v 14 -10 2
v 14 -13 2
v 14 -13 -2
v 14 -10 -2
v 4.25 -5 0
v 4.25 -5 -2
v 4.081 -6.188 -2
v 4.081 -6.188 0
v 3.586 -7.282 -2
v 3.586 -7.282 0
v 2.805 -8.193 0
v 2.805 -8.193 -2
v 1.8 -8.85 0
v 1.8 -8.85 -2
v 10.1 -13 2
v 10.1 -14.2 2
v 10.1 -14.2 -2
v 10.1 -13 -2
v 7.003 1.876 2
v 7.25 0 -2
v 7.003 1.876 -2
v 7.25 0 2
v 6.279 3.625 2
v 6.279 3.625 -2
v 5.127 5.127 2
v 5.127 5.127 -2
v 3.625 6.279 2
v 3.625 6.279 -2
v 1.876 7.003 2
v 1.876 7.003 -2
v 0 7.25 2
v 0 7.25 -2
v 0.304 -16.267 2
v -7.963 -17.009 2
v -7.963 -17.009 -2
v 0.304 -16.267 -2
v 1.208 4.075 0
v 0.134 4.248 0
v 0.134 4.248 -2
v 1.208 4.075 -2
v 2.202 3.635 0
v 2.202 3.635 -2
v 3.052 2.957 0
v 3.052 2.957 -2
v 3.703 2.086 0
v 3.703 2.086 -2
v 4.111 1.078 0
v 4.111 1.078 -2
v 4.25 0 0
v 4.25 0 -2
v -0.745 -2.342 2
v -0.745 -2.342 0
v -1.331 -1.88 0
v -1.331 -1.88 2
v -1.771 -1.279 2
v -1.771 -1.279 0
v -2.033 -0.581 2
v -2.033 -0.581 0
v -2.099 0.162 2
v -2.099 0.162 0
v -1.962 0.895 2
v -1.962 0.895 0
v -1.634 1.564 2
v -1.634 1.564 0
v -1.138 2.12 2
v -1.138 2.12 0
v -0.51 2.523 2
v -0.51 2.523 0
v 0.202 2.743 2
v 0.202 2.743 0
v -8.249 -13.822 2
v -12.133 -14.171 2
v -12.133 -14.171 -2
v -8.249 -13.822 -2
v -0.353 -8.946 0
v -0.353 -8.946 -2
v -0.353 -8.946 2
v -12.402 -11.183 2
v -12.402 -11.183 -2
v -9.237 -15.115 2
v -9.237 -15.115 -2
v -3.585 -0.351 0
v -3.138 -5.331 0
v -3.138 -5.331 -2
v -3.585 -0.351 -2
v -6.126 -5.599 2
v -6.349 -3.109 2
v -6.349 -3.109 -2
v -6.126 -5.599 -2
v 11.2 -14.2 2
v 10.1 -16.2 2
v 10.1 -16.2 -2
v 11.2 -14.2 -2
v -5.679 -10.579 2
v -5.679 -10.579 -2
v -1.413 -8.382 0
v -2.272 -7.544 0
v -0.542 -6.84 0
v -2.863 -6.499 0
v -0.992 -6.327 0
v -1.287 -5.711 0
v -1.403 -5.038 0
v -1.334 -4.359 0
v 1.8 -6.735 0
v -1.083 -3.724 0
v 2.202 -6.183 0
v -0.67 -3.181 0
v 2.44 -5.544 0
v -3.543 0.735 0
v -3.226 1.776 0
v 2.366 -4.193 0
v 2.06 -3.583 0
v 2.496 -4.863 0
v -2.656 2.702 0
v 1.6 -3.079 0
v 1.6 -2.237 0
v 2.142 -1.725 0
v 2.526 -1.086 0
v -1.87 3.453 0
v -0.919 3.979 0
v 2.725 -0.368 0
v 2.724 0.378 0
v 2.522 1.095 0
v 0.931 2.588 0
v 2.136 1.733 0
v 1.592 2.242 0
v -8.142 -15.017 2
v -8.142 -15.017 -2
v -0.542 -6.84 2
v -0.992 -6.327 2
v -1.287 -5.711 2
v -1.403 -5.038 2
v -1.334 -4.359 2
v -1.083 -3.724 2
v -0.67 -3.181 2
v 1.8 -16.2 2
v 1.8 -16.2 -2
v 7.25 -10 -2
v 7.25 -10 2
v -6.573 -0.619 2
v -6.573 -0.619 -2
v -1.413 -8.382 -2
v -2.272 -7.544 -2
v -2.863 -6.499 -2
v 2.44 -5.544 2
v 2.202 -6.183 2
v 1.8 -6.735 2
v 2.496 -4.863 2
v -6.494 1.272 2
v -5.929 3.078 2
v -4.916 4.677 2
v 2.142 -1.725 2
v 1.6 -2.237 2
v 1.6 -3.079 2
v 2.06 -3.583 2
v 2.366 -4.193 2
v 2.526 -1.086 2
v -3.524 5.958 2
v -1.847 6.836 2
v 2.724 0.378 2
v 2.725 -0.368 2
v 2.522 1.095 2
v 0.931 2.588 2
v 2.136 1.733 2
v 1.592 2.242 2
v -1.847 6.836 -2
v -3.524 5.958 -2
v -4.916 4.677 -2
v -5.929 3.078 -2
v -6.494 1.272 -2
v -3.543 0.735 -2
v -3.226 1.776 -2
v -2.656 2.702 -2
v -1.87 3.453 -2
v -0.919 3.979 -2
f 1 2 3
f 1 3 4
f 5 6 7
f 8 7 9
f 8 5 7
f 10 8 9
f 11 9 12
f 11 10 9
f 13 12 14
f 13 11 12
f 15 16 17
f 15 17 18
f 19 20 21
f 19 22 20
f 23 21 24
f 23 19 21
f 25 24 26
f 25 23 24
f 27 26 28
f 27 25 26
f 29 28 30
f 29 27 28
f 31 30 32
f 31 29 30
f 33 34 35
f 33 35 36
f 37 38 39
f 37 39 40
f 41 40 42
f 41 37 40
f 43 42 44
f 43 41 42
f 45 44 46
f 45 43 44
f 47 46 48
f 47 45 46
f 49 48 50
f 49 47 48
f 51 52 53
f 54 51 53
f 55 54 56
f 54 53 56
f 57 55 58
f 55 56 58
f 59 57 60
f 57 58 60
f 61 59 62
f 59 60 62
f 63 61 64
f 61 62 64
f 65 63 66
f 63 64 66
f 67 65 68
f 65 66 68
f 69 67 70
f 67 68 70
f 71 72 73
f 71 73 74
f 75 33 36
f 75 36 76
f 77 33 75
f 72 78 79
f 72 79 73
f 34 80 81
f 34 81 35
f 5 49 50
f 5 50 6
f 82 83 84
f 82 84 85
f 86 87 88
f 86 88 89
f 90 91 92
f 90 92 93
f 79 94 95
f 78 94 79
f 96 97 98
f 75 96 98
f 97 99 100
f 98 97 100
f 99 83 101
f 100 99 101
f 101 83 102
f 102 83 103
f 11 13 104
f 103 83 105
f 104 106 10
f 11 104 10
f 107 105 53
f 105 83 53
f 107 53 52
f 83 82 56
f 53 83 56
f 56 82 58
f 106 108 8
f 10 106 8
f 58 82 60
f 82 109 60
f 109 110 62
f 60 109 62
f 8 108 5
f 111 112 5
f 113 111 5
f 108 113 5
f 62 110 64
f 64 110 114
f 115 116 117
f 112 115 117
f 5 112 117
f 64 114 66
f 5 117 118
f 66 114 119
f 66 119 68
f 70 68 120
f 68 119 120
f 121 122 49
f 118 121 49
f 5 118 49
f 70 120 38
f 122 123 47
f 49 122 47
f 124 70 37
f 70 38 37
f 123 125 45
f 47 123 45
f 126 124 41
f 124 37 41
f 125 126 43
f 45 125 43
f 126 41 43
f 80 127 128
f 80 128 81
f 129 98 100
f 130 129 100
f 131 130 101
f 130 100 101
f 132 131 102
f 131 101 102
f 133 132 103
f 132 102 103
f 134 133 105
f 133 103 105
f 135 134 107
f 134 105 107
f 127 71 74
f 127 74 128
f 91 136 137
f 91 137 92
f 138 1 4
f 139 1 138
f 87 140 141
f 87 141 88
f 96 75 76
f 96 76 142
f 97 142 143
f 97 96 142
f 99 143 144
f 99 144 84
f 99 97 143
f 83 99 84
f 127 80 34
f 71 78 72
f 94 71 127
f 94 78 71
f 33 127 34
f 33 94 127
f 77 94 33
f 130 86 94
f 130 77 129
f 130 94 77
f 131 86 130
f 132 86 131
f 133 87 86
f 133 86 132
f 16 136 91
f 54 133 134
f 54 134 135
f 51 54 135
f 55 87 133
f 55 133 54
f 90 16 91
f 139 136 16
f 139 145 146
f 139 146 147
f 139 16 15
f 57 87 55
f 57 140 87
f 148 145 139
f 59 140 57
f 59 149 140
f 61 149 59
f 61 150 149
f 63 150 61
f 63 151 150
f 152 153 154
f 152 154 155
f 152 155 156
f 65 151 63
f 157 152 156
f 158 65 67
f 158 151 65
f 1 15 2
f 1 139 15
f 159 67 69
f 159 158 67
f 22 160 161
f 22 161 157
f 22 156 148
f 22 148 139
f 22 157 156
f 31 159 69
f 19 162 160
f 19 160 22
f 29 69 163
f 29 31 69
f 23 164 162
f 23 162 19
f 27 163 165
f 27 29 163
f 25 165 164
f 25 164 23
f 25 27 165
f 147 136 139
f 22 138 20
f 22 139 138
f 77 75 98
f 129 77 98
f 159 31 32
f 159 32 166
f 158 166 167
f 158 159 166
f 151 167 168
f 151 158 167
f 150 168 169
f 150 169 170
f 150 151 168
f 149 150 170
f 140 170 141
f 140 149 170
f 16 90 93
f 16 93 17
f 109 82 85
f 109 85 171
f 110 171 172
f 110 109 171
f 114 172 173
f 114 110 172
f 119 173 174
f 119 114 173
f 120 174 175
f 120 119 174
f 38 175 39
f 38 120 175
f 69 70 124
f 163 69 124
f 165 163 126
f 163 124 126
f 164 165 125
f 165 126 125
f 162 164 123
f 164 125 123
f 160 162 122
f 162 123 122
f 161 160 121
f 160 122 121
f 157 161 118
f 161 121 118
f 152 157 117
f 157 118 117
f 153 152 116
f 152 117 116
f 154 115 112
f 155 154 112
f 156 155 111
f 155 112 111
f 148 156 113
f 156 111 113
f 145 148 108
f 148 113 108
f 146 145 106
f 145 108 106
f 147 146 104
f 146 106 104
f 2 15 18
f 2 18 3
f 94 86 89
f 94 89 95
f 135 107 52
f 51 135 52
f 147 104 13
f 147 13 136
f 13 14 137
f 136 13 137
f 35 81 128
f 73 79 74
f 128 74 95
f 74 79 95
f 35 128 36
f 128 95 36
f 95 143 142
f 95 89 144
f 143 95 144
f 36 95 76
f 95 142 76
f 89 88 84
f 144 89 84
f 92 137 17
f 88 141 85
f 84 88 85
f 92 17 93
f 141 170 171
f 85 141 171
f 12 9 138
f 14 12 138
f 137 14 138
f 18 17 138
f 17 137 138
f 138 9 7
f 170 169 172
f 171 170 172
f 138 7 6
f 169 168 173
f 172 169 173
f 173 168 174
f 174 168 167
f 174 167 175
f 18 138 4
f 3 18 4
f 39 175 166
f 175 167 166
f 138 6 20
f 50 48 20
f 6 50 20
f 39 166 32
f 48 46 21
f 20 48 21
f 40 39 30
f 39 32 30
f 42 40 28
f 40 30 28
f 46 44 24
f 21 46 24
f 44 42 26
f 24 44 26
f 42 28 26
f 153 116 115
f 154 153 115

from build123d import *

# Parameters (mm, degrees)
F1_DEPTH = 2
F2_DEPTH = 2


with BuildPart() as f1:
    # F0 (on Top) → F1 (new body, symmetric)
    with BuildSketch(Plane.XY):
        with BuildLine():
            Line((0, 7.25), (0.1344755479, 4.2478719763))
            ThreePointArc((0.1344755479, 4.2478719763), (3.05237785, 2.957277373), (4.25, 0))
            Line((4.25, 0), (4.25, -2.5))
            Line((4.25, -2.5), (4.25, -5))
            ThreePointArc((4.25, -5), (3.5855613229, -7.2817208418), (1.8, -8.85))
            Line((1.8, -8.85), (1.8, -16.2))
            Line((1.8, -16.2), (10.1, -16.2))
            Line((10.1, -16.2), (11.2, -14.2))
            Line((11.2, -14.2), (10.1, -14.2))
            Line((10.1, -14.2), (10.1, -13))
            Line((10.1, -13), (14, -13))
            Line((14, -13), (14, -10))
            Line((14, -10), (7.25, -10))
            Line((7.25, -10), (7.25, -5))
            Line((7.25, -5), (7.25, -2.5))
            Line((7.25, -2.5), (7.25, 0))
            ThreePointArc((7.25, 0), (5.1265241636, 5.1265241636), (0, 7.25))
        make_face()
        with BuildLine():
            ThreePointArc((-3.5847754908, -0.3509463017), (-2.6563522123, 2.7015638934), (0.1344755479, 4.2478719763))
            Line((0.1344755479, 4.2478719763), (0, 7.25))
            ThreePointArc((0, 7.25), (-4.9161386256, 4.6766790635), (-6.5727609006, -0.6191685802))
            Line((-6.5727609006, -0.6191685802), (-6.3492423351, -3.1091564217))
            Line((-6.3492423351, -3.1091564217), (-6.1257237697, -5.5991442632))
            Line((-6.1257237697, -5.5991442632), (-5.6786866388, -10.5791199463))
            Line((-5.6786866388, -10.5791199463), (-12.4016538108, -11.182620073))
            Line((-12.4016538108, -11.182620073), (-12.1334315323, -14.1706054828))
            Line((-12.1334315323, -14.1706054828), (-8.2490504995, -13.8219165207))
            Line((-8.2490504995, -13.8219165207), (-8.1417615881, -15.0171106846))
            Line((-8.1417615881, -15.0171106846), (-9.2373562384, -15.1154588534))
            Line((-9.2373562384, -15.1154588534), (-7.9629467358, -17.0091009579))
            Line((-7.9629467358, -17.0091009579), (0.3038128981, -16.2670193205))
            Line((0.3038128981, -16.2670193205), (-0.3533316844, -8.9464550665))
            ThreePointArc((-0.3533316844, -8.9464550665), (-2.2719578811, -7.5440990943), (-3.1377383598, -5.3309219847))
            Line((-3.1377383598, -5.3309219847), (-3.3612569253, -2.8409341432))
            Line((-3.3612569253, -2.8409341432), (-3.5847754908, -0.3509463017))
        make_face()
    extrude(amount=F1_DEPTH, both=True)

    # F0 (on Top) → F2 (join)
    with BuildSketch(Plane.XY):
        with BuildLine():
            ThreePointArc((-0.7454173221, -2.3416861616), (-2.0552688347, 0.5327569072), (0.2019027868, 2.7425782149))
            Line((0.2019027868, 2.7425782149), (0.1344755479, 4.2478719763))
            ThreePointArc((0.1344755479, 4.2478719763), (-2.6563522123, 2.7015638934), (-3.5847754908, -0.3509463017))
            Line((-3.5847754908, -0.3509463017), (-3.3612569253, -2.8409341432))
            Line((-3.3612569253, -2.8409341432), (-3.1377383598, -5.3309219847))
            ThreePointArc((-3.1377383598, -5.3309219847), (-2.2719578811, -7.5440990943), (-0.3533316844, -8.9464550665))
            Line((-0.3533316844, -8.9464550665), (-0.5424341882, -6.8398607695))
            ThreePointArc((-0.5424341882, -6.8398607695), (-1.403238856, -5.0381101155), (-0.6700973051, -3.1807481254))
            Line((-0.6700973051, -3.1807481254), (-0.7454173221, -2.3416861616))
        make_face()
        with BuildLine():
            ThreePointArc((0.2019027868, 2.7425782149), (2.6476091797, 0.7434148448), (1.6, -2.2366269246))
            Line((1.6, -2.2366269246), (1.6, -3.0790627288))
            ThreePointArc((1.6, -3.0790627288), (2.4962673742, -4.8634379387), (1.8, -6.7349351573))
            Line((1.8, -6.7349351573), (1.8, -8.85))
            ThreePointArc((1.8, -8.85), (3.5855613229, -7.2817208418), (4.25, -5))
            Line((4.25, -5), (4.25, -2.5))
            Line((4.25, -2.5), (4.25, 0))
            ThreePointArc((4.25, 0), (3.05237785, 2.957277373), (0.1344755479, 4.2478719763))
            Line((0.1344755479, 4.2478719763), (0.2019027868, 2.7425782149))
        make_face()
    extrude(amount=F2_DEPTH)


solid = f1.part
